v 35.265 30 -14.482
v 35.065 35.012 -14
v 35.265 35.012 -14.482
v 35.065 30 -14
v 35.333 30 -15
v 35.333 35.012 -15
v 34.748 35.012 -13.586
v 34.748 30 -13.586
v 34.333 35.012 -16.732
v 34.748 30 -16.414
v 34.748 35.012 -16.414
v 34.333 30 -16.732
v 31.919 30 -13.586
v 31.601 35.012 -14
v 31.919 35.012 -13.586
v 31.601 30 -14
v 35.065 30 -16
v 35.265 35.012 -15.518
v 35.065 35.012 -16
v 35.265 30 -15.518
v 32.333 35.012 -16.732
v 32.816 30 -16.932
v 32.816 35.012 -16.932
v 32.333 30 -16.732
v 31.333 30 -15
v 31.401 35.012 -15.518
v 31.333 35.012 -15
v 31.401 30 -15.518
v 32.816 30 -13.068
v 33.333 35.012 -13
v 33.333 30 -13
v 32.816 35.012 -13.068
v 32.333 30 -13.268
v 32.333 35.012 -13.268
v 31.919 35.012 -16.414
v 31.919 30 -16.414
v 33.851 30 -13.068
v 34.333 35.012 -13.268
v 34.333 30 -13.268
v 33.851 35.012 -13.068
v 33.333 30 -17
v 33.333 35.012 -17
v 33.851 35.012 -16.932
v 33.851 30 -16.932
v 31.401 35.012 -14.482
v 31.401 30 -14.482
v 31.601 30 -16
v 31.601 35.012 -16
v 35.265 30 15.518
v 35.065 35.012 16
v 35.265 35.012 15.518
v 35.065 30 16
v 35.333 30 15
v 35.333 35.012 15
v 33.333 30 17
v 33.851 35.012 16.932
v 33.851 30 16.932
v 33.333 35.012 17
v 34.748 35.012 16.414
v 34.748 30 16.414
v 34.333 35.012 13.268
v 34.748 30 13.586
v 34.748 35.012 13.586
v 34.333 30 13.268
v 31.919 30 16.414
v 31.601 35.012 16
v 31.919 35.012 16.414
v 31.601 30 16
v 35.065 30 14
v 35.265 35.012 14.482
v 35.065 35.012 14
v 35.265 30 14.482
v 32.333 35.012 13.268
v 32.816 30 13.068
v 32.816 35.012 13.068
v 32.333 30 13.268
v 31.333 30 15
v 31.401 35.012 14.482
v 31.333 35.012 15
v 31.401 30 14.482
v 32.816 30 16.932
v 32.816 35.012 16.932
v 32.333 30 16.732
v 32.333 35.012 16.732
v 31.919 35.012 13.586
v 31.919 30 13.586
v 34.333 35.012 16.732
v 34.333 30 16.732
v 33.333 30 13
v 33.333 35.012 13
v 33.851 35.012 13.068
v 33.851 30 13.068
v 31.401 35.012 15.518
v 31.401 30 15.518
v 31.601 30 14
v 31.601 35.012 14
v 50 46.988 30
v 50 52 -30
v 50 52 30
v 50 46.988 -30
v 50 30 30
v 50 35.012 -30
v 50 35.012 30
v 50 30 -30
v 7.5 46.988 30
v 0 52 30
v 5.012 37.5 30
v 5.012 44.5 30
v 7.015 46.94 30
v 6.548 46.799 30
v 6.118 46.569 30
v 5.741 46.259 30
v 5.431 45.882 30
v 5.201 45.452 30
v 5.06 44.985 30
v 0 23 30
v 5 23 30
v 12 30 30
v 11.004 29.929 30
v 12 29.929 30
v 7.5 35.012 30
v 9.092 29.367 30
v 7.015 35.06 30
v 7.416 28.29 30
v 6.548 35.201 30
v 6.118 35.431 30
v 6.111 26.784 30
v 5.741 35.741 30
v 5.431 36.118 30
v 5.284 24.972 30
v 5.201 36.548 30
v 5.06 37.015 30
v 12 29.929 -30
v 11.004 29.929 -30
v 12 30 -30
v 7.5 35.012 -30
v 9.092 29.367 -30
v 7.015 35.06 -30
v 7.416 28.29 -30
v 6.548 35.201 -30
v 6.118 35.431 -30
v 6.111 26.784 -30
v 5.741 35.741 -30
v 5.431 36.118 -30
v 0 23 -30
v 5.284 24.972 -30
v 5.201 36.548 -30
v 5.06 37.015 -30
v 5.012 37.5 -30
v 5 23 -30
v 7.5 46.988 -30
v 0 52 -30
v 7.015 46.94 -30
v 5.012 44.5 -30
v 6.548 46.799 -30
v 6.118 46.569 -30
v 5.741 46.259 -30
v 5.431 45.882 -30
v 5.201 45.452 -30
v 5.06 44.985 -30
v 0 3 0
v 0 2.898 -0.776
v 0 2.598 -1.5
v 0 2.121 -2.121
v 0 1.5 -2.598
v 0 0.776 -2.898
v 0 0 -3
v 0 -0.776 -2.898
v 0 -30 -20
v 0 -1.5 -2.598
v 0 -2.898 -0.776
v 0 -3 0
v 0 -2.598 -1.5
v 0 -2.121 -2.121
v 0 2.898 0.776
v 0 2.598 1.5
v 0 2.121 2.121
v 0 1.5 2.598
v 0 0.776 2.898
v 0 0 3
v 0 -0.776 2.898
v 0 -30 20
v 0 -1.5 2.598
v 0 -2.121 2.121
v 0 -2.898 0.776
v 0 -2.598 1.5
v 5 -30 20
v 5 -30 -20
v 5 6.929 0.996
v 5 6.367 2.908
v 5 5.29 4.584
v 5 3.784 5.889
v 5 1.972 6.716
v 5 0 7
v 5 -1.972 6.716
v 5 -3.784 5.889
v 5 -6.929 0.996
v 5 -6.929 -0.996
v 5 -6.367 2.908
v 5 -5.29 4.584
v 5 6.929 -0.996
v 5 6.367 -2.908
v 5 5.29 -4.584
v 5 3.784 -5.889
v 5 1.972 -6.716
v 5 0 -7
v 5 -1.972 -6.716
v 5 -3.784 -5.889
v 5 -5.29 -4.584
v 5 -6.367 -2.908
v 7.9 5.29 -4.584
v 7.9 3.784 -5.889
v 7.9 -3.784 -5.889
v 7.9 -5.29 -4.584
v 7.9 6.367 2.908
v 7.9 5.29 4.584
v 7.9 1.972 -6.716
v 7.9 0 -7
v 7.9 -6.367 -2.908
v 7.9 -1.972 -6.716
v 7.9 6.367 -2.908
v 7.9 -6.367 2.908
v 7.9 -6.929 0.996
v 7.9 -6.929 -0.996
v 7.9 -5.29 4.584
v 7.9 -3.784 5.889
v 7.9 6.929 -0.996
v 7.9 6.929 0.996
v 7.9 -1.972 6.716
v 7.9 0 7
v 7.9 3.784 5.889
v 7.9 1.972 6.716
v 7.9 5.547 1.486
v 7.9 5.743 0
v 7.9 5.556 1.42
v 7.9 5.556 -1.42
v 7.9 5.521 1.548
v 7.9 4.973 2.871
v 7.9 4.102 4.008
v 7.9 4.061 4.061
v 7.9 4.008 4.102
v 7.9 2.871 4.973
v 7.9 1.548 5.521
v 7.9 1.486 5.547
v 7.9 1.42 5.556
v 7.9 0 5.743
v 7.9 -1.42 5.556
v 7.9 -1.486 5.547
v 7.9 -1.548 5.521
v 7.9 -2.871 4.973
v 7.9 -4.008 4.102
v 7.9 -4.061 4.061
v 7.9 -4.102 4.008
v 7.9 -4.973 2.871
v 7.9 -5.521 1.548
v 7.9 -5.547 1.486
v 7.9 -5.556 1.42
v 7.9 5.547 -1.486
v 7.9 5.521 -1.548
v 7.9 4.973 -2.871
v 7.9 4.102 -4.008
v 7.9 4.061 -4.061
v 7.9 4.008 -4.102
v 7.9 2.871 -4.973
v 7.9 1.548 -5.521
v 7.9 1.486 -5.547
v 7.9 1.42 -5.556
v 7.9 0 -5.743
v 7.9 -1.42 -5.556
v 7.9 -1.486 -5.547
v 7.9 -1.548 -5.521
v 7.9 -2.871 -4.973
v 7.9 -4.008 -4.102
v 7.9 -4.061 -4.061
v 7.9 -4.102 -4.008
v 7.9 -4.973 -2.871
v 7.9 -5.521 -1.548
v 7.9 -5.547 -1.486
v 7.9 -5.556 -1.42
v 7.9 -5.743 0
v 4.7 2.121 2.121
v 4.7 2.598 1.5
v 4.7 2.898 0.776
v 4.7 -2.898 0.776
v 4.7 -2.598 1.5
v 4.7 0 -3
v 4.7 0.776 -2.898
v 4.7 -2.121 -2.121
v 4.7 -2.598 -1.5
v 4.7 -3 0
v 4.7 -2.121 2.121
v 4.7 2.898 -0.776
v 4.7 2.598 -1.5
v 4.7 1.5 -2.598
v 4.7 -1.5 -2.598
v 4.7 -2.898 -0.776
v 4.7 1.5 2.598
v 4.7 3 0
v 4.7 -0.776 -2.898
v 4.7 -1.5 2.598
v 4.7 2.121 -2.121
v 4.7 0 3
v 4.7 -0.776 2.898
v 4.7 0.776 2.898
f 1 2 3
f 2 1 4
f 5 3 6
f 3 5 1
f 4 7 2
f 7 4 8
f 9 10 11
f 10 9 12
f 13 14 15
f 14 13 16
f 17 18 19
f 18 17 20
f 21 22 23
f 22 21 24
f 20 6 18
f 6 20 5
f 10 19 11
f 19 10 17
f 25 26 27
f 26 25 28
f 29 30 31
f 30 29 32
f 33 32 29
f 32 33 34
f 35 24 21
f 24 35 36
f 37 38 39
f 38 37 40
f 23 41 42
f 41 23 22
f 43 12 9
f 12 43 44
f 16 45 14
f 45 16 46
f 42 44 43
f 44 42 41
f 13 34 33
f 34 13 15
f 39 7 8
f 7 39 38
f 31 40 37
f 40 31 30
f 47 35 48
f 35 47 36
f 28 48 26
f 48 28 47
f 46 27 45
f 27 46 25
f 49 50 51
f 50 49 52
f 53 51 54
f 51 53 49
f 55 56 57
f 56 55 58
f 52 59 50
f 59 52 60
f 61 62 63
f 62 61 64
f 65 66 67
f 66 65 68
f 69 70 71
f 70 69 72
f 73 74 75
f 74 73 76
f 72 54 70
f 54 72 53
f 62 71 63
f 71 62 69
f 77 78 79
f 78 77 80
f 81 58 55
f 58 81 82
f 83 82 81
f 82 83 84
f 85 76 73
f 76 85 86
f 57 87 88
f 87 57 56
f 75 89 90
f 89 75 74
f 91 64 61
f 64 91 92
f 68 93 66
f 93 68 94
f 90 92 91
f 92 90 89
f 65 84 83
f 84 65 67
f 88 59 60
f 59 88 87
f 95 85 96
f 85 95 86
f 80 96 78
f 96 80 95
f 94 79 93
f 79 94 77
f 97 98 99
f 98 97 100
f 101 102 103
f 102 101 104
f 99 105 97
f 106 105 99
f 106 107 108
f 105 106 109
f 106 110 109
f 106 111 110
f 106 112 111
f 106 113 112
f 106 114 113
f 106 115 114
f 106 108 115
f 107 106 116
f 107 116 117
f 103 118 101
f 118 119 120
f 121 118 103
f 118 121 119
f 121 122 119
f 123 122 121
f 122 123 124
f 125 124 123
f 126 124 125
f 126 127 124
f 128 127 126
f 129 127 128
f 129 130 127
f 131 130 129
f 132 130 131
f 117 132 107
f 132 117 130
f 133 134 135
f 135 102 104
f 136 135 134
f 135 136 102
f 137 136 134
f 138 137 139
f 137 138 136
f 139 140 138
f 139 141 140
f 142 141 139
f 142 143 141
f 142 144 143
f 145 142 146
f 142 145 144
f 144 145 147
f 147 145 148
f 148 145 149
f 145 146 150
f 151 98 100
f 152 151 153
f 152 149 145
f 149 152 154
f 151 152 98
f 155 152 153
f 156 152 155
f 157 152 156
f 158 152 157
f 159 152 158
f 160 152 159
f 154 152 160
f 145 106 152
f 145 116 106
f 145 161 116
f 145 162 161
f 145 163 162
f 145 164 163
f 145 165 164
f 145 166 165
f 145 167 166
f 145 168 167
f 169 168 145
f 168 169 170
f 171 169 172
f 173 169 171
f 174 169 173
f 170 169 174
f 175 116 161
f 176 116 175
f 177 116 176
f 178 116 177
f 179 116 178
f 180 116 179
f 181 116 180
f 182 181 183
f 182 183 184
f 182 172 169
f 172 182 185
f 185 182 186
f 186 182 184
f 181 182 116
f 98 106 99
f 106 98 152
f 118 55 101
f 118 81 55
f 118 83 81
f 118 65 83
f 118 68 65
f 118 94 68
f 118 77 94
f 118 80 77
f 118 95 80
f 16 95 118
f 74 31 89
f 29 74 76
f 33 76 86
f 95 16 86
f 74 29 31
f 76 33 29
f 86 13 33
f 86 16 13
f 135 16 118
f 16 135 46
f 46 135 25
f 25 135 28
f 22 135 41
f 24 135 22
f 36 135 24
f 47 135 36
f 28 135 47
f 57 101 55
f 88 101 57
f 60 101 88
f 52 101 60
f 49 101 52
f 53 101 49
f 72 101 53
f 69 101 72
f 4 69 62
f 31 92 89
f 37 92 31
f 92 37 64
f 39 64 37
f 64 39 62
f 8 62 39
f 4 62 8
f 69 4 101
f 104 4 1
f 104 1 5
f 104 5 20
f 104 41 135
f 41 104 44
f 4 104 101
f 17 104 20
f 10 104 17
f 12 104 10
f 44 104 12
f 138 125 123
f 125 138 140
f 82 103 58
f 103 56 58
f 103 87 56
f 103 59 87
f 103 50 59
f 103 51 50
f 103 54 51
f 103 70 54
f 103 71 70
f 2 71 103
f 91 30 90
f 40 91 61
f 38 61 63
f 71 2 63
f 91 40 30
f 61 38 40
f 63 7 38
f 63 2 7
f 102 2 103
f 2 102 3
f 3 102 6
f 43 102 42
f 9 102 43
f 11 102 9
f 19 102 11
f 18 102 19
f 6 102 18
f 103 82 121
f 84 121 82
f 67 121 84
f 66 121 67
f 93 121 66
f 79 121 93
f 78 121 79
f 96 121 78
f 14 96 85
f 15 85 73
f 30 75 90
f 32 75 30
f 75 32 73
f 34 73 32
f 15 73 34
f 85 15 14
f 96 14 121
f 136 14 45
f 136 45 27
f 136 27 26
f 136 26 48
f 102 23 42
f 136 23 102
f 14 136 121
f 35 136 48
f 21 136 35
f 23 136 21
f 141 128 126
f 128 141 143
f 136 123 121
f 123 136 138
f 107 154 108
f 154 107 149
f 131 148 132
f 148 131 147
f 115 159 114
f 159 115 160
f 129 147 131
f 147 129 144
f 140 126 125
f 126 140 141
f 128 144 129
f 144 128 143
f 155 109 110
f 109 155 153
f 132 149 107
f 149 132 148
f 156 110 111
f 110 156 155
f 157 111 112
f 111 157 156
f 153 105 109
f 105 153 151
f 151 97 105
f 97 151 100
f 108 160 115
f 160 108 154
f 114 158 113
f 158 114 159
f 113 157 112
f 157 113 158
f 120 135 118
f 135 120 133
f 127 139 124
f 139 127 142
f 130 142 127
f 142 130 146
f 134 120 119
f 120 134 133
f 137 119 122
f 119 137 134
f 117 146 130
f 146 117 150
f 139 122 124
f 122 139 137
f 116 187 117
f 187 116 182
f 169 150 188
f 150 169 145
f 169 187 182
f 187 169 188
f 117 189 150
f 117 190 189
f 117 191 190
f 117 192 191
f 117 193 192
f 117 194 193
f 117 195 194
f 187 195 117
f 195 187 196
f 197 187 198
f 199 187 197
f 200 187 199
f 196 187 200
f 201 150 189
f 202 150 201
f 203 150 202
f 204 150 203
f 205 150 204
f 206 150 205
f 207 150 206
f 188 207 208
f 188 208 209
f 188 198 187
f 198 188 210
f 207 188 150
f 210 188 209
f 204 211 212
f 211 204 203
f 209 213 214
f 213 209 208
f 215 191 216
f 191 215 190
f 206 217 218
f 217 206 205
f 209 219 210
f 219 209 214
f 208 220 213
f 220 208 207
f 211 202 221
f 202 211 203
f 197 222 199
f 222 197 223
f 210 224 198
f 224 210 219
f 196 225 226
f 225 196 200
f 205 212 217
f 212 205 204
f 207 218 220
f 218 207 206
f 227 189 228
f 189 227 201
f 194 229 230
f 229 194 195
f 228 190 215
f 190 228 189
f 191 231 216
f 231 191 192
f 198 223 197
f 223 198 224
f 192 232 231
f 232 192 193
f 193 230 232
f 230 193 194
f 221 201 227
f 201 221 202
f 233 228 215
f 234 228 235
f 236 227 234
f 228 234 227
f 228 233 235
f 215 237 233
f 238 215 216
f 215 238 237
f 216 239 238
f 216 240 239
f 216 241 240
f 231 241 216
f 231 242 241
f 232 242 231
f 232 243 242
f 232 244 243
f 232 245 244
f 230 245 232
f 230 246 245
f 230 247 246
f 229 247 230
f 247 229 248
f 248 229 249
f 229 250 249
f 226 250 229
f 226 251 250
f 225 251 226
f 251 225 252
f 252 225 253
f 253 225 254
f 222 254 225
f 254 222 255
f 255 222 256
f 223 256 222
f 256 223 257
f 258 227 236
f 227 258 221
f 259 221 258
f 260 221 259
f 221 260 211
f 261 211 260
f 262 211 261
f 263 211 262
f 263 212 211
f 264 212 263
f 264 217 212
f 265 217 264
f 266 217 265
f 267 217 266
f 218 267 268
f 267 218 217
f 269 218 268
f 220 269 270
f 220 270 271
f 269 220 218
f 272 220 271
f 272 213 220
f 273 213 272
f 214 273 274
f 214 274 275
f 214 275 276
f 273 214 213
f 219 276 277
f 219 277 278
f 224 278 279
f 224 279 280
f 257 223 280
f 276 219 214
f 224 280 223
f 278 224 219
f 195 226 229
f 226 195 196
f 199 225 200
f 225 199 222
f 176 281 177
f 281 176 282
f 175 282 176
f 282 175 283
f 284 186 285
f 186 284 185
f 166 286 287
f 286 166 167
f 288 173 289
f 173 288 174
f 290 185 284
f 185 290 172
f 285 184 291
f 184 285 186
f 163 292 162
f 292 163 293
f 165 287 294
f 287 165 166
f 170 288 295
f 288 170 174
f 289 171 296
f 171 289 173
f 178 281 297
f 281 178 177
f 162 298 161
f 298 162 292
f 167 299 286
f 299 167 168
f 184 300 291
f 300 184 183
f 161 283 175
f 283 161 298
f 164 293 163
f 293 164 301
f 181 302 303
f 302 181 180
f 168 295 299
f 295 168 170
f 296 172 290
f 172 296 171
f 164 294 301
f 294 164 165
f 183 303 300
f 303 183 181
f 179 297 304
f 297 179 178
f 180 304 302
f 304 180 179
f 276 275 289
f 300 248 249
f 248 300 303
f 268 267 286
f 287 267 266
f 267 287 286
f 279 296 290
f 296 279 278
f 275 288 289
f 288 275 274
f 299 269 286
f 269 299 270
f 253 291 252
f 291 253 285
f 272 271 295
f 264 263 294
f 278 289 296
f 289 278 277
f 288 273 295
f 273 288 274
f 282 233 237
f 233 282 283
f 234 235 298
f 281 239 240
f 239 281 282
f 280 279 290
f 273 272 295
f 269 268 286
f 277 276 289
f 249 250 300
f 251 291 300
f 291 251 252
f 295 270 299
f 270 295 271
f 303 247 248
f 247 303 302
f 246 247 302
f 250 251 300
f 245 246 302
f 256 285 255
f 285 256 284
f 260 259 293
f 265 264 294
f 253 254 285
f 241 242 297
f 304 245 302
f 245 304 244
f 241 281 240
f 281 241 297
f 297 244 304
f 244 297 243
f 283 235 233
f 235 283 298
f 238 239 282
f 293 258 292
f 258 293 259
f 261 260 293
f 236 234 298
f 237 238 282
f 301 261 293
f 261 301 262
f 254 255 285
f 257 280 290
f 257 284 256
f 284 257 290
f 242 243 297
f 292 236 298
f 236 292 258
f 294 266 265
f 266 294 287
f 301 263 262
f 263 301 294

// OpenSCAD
/*  EasyShelves. Wall mount Generator. Enables users of the Moidules/EasyShelves
    modules to create a customized wall mount bracket. The design is simple in order to be easilly printable.
    EasyShelves is Not Moidules.
    Copyright (C) 2015  PMorel for Thilab (www.thilab.fr)

    This program is free software: you can redistribute it and/or modify
    it under the terms of the GNU General Public License as published by
    the Free Software Foundation, either version 3 of the License, or
    (at your option) any later version.

    This program is distributed in the hope that it will be useful,
    but WITHOUT ANY WARRANTY; without even the implied warranty of
    MERCHANTABILITY or FITNESS FOR A PARTICULAR PURPOSE.  See the
    GNU General Public License for more details.

    You should have received a copy of the GNU General Public License
    along with this program.  If not, see <http://www.gnu.org/licenses/>.
*/

//Thickness of the walls
wall_thickness=5;
// Height of the piece that supports the polehanger
support_height=60;
// Width of the support at the top near the bracket
support_width_top=60;
// Width of the support at the bottom
support_width_bottom=40;
//Thickness of the wood
wood_thickness=12;
//Depth of the bracket
depth=50;
//Bracket Screws
number_of_screws = 2; //[0,1,2]
//Screw diameter
bracket_screw_diameter = 4; //[1:12]
//Top screws
top_screws = "no";
//Inner screws
inner_screws= "yes";
// Support screw diameter
support_screw_diameter = 6;
//countersunk height
countersunk_height = 3;

/* [Hidden] */
// The height of the bracket
hCube = wood_thickness+2*wall_thickness;
// length of the bracket 
front_side_length = support_width_top;
//Fillet of the pole hanger
fillet_size = 5;
//Fillet inside the bracket
board_fillet_size=0.5;
//Fillet between the bracket and the support
link_fillet=7;
//countersunk diameter
countersunk_diameter=support_screw_diameter*2+2;

//Main module
wallMount();


// This module creates the complete wall mount bracket. 
module wallMount() {
    difference() {
       union() {
            //The main piece
            translate([0,support_height/2-link_fillet,-support_width_top/2]) rotate([90,-90,90]) trapezoid(support_width_top, support_width_bottom, support_height-link_fillet,wall_thickness);
            // Create the bracket
            translate([0,support_height/2,-support_width_top/2]) 
                difference() {
                    bracket(inner_screws,top_screws,0);
                    translate([wall_thickness,wall_thickness,0]) 
                        boardH(0);
                }
            // Create the fillet between the bracket and the support
            translate([0,support_height/2-link_fillet,-support_width_top/2]) {
                difference() {
                    cube([link_fillet+wall_thickness,link_fillet,support_width_top]);
                    translate([link_fillet+wall_thickness,0,-0.1]) cylinder(r=link_fillet, h=support_width_top+1);
                }
            }
            // Countersunck hole
            translate([wall_thickness-0.1,0,0]) rotate([0,90,0]) cylinder(r=countersunk_diameter/2, h=countersunk_height);
            
        }
        union() {
        // Support screw hole
        translate([-0.1,0,0]) rotate([0,90,0]) cylinder($fn=24, r=support_screw_diameter/2, h=countersunk_height+wall_thickness+0.2);
        translate([wall_thickness-0.3,0,0]) rotate([0,90,0]) cylinder($fn=24, r1=support_screw_diameter/2, h=countersunk_height+0.5, r2=countersunk_diameter/2-1);
        }
    }
}


// Create a trapezoid
module trapezoid(width_base, width_top,height,thickness) {
    linear_extrude(height = thickness) polygon(points=[[0,0],[width_base,0],[width_base-(width_base-width_top)/2,height],[(width_base-width_top)/2,height]], paths=[[0,1,2,3]]);
}

module boardH( shift ) {
    sphere_radius = board_fillet_size*wall_thickness;
    board_cube_thickness = wood_thickness-sphere_radius*2;
    translate([sphere_radius,sphere_radius,0])
        minkowski() {
            sphere($fn=32, r=sphere_radius);
            cube([depth, board_cube_thickness, front_side_length]);
            }
}

// Draw the bracket shape
module bracket( left_screws, right_screws, shift) {
        rotate([0,0,0]) {
            difference() {
                cube([depth,hCube,front_side_length]);
                
                //Draw the left screws
                if( left_screws == "yes" ) {
                    width = wall_thickness;
                    height = front_side_length;
                    if( number_of_screws == 1 ) { 
                      translate([depth*2/3,wall_thickness+0.1,front_side_length/2]) rotate([90,0,0]) cylinder($fn=24, r=bracket_screw_diameter/2, h=width+2);                
                    } else if(number_of_screws == 2) {
                      translate([depth*2/3,wall_thickness+0.1,front_side_length/4]) rotate([90,0,0]) cylinder($fn=24, r=bracket_screw_diameter/2, h=width+2);                
                      translate([depth*2/3,wall_thickness+0.1,front_side_length*3/4]) rotate([90,0,0]) cylinder($fn=24, r=bracket_screw_diameter/2, h=width+2);             
                    }
                }
                //Draw the right screws
                if( right_screws == "yes" ) {
                    width = wall_thickness;
                    screw_shift = wall_thickness*2 + wood_thickness + 1;
                    height = front_side_length;
                    if( number_of_screws == 1 ) { 
                      translate([depth*2/3,screw_shift+0.1,front_side_length/2]) rotate([90,0,0]) cylinder($fn=24, r=bracket_screw_diameter/2, h=width+2);                
                    } else if(number_of_screws == 2) {
                      translate([depth*2/3,screw_shift+0.1,front_side_length/4]) rotate([90,0,0]) cylinder($fn=24, r=bracket_screw_diameter/2, h=width+2);                
                      translate([depth*2/3,screw_shift+0.1,front_side_length*3/4]) rotate([90,0,0]) cylinder($fn=24, r=bracket_screw_diameter/2, h=width+2);             
                    }
                }
           }
       }
}
